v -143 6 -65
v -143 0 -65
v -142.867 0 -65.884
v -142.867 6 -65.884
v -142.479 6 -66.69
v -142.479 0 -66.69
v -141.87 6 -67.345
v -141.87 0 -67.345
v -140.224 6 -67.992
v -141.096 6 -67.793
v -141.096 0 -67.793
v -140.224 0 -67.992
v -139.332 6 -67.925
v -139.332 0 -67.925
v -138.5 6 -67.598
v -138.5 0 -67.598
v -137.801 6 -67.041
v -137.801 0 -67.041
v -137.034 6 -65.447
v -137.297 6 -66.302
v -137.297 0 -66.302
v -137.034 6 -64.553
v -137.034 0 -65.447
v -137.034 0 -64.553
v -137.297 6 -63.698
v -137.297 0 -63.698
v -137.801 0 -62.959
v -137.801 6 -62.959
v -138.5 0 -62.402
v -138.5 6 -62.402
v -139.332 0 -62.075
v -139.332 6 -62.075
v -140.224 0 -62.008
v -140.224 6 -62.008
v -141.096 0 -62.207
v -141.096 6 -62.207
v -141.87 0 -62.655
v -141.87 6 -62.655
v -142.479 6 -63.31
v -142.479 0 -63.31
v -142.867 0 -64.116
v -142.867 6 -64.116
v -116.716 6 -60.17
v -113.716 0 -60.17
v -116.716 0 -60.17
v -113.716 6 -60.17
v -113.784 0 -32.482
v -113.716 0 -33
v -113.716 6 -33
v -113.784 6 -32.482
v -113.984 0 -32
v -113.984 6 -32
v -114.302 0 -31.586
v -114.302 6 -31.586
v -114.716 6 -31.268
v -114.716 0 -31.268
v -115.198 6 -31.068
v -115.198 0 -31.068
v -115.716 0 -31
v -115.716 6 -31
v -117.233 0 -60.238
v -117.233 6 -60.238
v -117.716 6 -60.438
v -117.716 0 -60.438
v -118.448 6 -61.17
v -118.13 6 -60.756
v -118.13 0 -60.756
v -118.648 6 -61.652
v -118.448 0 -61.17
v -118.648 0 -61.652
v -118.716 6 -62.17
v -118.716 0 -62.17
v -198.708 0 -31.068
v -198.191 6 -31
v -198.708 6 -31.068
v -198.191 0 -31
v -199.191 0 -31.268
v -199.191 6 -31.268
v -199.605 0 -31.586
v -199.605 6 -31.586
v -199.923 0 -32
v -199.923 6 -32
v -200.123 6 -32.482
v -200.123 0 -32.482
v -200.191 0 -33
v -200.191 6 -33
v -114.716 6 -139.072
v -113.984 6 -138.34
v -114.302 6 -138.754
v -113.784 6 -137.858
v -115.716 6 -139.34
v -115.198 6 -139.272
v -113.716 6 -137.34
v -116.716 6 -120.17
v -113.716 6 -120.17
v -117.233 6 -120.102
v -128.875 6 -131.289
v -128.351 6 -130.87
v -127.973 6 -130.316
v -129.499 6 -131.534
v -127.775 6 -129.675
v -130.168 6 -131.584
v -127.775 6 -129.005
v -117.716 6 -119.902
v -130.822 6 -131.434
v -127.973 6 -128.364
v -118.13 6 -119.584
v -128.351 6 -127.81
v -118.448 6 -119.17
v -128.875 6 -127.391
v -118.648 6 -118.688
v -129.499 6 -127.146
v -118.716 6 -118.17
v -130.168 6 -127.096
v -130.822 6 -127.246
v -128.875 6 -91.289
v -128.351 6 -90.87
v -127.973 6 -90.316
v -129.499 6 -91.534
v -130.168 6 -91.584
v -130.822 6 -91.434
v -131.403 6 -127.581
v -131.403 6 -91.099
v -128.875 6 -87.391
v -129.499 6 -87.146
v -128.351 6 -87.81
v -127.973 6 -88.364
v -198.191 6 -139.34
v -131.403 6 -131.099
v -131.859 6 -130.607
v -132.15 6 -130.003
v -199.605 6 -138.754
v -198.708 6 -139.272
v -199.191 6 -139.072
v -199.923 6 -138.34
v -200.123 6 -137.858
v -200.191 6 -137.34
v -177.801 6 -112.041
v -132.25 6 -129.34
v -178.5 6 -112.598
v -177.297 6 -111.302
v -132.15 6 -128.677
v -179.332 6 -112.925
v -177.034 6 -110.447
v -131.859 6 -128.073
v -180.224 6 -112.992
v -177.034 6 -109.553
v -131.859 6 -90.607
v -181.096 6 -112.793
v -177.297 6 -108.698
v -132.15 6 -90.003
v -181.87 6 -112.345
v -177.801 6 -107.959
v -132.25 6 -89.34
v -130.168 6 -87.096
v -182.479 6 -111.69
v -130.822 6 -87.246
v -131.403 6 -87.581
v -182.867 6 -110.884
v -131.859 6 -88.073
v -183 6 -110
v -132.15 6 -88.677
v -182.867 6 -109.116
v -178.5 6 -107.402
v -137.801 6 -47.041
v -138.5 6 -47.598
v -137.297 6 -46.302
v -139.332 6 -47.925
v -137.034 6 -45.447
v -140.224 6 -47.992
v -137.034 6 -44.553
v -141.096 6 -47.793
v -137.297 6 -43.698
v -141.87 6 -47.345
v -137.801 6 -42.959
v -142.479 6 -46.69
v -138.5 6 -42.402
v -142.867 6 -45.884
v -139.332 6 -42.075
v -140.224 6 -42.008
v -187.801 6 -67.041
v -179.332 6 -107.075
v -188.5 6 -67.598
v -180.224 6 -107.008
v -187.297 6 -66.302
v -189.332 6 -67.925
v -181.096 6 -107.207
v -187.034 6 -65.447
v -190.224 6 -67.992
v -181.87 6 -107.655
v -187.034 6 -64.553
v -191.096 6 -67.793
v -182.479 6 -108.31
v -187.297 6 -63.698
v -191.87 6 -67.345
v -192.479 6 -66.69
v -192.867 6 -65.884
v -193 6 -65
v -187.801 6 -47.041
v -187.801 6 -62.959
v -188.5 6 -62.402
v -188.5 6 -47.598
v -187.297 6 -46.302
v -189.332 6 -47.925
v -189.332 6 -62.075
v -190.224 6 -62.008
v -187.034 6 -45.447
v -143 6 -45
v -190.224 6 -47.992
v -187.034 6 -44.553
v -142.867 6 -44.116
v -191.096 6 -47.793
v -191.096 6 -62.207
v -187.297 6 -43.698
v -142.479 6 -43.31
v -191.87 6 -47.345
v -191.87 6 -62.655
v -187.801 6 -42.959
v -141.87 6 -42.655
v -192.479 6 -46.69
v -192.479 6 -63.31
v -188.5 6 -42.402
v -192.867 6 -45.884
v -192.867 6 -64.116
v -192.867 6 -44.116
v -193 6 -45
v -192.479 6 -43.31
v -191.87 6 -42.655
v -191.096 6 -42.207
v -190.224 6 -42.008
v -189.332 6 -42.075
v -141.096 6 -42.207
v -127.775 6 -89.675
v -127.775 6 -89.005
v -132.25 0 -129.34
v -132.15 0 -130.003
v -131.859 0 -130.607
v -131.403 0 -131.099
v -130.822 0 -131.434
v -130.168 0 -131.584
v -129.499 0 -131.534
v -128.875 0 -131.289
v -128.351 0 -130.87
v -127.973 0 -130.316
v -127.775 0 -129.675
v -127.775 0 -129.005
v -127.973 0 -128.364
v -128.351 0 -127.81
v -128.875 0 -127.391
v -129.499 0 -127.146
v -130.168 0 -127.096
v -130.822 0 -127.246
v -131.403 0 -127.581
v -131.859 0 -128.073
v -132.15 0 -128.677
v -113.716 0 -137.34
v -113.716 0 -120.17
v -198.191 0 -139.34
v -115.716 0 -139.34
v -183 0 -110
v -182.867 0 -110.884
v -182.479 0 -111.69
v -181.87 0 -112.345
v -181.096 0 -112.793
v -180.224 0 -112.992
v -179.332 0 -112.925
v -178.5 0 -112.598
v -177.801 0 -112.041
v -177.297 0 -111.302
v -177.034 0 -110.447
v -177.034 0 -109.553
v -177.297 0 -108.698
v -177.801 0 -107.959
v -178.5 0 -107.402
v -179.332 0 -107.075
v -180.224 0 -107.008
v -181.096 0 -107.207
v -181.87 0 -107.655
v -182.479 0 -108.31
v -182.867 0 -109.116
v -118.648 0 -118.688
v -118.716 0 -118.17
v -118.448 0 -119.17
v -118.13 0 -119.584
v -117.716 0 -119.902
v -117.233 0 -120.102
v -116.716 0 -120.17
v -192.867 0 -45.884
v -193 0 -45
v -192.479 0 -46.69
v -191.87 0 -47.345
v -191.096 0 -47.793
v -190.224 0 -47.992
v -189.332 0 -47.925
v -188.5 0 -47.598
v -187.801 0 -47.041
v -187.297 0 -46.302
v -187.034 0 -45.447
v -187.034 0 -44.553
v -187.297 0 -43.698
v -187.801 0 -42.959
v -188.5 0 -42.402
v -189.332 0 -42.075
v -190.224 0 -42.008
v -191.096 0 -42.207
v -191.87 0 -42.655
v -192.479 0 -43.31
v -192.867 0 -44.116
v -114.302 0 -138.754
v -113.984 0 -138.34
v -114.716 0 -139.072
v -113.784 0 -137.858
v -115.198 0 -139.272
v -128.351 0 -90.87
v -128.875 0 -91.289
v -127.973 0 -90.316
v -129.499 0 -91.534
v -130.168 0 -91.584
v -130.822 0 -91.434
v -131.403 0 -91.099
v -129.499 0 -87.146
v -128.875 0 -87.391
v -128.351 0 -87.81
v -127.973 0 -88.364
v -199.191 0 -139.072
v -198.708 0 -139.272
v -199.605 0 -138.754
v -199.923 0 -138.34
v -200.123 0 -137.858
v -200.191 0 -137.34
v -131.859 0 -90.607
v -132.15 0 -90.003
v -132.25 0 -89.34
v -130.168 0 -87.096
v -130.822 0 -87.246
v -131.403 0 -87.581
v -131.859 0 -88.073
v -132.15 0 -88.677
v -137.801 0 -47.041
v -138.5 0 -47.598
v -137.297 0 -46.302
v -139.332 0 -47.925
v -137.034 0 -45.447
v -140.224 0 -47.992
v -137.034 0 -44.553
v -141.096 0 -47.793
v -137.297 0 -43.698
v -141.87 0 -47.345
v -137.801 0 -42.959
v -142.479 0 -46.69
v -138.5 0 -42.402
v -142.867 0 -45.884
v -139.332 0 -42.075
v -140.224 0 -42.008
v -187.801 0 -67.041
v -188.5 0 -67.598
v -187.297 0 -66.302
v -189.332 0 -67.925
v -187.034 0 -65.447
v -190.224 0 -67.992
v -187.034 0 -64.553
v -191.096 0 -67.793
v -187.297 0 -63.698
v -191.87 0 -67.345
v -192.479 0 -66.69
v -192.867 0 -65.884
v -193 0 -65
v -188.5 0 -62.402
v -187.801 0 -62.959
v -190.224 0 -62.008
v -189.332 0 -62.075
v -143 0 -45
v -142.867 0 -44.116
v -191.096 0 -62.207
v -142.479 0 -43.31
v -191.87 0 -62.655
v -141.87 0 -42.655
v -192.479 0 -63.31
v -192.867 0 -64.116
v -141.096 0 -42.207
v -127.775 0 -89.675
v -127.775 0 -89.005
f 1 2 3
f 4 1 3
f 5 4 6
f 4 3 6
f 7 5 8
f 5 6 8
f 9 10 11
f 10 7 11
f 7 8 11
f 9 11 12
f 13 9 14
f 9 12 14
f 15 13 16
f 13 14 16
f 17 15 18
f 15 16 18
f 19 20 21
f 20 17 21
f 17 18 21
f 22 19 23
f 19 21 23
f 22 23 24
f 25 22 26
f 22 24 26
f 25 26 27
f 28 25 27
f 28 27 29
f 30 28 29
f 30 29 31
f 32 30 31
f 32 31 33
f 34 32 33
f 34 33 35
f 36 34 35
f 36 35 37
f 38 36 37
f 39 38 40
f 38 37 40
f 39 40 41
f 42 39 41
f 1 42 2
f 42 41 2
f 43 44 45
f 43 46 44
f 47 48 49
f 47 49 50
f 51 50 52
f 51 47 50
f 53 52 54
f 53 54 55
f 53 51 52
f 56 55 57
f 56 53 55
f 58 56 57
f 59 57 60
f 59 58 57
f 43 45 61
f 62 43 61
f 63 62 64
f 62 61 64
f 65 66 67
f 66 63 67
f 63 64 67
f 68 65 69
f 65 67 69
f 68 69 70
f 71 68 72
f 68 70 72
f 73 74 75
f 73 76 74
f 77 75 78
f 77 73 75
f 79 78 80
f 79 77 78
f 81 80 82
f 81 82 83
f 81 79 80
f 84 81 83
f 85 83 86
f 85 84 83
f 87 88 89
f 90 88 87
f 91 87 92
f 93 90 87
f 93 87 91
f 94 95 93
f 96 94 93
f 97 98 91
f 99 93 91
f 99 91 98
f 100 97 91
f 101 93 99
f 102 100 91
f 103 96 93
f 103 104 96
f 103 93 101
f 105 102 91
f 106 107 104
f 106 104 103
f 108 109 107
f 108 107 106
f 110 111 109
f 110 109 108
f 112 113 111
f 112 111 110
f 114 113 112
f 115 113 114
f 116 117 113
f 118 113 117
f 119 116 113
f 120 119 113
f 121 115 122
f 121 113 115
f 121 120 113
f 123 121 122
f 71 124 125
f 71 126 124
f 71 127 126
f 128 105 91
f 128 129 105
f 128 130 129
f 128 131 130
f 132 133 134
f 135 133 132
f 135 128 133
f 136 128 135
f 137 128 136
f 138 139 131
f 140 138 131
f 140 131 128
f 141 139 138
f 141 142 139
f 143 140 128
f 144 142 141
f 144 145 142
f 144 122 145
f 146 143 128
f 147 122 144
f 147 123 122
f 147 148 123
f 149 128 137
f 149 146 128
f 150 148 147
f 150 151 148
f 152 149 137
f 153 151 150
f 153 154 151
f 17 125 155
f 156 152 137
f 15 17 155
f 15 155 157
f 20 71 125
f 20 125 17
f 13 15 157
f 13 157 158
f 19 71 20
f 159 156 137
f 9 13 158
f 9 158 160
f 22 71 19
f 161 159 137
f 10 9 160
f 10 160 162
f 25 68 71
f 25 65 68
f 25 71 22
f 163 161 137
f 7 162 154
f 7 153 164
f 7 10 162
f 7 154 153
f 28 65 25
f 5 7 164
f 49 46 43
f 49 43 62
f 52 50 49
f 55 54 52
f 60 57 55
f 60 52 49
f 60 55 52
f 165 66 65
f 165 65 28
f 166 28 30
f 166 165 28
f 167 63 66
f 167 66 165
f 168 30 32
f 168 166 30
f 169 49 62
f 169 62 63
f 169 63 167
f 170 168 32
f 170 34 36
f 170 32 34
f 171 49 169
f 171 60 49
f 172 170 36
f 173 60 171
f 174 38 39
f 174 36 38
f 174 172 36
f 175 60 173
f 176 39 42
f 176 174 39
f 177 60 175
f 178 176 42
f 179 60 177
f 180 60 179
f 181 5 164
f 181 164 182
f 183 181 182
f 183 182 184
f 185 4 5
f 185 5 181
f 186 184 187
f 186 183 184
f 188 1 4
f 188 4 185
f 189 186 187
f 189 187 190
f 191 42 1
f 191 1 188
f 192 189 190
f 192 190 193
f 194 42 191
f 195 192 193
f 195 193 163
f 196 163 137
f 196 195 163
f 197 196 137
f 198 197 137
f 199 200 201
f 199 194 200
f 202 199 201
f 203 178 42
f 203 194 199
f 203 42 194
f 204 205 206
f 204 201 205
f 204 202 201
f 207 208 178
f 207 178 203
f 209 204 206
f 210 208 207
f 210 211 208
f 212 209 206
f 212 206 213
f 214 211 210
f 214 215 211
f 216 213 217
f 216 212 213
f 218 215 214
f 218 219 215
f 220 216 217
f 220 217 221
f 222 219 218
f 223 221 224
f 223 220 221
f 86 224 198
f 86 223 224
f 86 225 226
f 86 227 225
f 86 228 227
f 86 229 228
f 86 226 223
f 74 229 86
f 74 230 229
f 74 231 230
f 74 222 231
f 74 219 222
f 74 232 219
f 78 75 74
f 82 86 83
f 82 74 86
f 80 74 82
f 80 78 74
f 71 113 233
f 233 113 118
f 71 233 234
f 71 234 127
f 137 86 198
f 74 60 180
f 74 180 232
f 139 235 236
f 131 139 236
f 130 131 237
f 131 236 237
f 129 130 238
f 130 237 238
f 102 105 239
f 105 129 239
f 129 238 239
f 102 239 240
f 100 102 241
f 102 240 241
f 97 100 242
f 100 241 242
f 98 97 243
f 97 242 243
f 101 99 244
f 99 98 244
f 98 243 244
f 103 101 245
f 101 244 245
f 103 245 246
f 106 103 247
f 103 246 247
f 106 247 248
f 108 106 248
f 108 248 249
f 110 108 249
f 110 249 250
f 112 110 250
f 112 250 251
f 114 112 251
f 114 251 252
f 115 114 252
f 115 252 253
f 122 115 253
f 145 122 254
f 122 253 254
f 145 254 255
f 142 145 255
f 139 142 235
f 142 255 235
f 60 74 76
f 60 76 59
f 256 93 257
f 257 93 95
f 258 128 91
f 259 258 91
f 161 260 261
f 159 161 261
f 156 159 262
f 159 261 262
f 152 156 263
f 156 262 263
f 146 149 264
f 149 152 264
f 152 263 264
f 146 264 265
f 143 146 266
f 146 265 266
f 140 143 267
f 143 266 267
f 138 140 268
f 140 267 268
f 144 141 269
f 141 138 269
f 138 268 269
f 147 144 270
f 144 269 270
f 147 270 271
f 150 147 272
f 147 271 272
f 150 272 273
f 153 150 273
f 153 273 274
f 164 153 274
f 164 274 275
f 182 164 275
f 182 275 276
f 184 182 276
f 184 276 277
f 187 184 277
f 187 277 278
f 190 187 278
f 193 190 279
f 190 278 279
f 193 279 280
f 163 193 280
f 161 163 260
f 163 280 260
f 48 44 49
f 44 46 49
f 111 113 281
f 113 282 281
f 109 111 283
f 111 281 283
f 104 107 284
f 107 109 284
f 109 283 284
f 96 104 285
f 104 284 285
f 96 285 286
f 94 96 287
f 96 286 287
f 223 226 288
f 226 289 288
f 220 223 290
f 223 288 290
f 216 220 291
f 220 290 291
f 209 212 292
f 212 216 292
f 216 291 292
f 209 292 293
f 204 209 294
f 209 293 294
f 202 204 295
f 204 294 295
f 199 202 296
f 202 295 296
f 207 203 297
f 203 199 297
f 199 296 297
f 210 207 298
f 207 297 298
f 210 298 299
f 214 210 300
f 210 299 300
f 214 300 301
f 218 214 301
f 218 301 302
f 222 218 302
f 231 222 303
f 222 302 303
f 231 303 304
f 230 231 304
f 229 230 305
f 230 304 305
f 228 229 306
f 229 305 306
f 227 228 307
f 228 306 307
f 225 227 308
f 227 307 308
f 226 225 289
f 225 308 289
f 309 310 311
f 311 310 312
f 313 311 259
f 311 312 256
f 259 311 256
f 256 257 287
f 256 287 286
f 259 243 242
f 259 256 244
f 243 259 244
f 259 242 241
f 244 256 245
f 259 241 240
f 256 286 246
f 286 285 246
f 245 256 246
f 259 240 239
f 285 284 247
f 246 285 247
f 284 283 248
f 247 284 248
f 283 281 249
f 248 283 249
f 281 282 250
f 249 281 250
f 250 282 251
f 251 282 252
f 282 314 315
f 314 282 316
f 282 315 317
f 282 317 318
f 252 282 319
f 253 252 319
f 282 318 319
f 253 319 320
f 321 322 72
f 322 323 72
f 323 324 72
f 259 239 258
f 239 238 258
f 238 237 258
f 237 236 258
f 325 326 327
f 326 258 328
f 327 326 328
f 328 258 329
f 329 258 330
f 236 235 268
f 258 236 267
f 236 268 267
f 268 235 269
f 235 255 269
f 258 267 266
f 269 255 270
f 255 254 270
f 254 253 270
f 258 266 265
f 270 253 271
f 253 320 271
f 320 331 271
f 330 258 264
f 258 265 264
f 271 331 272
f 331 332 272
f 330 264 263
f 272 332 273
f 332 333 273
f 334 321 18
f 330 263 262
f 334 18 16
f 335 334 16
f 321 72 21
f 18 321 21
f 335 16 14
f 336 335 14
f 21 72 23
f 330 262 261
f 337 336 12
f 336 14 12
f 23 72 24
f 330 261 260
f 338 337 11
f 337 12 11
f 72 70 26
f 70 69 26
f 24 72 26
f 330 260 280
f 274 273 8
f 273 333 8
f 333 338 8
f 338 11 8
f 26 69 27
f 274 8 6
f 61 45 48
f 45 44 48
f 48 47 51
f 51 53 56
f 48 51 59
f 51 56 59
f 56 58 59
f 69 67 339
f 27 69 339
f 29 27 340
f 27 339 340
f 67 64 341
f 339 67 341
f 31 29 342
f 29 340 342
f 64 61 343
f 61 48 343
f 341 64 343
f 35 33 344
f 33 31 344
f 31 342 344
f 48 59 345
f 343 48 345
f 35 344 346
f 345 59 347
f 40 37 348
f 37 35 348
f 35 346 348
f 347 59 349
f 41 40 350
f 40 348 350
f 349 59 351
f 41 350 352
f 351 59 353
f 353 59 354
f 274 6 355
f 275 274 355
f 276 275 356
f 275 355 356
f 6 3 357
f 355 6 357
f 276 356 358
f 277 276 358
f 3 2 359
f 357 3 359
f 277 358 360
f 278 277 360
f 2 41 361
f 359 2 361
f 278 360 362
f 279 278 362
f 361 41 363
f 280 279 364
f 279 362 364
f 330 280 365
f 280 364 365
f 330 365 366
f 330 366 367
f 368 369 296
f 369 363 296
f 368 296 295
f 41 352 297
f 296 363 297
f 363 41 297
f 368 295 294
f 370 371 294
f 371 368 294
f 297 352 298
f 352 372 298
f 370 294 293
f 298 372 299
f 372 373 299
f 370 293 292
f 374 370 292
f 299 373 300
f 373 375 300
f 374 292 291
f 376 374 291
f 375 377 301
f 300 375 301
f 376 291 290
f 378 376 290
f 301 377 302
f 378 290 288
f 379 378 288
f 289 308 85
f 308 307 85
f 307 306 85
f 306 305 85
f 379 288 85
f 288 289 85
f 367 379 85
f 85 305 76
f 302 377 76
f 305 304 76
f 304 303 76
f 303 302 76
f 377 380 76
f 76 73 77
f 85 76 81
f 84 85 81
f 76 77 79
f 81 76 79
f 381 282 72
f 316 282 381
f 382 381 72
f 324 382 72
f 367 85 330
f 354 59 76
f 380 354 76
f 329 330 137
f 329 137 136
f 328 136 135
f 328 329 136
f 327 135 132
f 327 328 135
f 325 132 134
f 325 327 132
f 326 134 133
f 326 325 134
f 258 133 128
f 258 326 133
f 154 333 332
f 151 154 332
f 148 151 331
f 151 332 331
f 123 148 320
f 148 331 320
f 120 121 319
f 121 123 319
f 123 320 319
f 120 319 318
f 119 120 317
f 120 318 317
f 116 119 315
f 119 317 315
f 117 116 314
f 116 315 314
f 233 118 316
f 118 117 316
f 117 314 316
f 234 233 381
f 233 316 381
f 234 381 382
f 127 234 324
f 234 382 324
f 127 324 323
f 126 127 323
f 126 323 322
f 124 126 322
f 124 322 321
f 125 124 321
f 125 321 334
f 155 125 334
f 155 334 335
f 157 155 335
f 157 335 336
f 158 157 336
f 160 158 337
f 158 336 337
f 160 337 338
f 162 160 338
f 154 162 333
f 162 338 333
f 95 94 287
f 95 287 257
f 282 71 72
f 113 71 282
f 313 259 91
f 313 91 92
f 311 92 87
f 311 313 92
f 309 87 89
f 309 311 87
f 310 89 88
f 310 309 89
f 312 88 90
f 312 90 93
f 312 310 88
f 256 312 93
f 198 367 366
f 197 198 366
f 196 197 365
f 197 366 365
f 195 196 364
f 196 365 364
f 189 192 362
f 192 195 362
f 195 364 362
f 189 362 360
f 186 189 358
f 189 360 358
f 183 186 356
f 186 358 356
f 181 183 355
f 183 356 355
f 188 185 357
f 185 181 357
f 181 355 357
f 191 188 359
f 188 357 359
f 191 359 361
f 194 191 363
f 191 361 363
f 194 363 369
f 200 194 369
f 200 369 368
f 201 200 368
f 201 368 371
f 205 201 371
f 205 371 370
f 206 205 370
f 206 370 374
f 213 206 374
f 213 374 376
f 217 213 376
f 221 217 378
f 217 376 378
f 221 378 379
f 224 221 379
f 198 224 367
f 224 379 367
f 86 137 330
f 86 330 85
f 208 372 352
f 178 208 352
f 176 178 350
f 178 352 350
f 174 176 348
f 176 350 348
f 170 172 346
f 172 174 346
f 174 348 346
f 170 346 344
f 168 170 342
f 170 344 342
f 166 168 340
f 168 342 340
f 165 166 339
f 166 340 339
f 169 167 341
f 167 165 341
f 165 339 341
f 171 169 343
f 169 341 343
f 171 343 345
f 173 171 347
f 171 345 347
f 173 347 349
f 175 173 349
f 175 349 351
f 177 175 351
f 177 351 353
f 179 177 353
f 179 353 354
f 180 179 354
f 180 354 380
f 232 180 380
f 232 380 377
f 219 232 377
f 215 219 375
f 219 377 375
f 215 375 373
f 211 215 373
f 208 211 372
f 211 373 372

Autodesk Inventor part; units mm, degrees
ref_plane "YZ Plane" through (0, 0, 0) normal (1, 0, 0) x (0, 1, 0)
ref_plane "XZ Plane" through (0, 0, 0) normal (0, 1, 0) x (-1, 0, 0)
ref_plane "XY Plane" through (0, 0, 0) normal (0, 0, 1) x (1, 0, 0)
sketch "Sketch1" plane through (0, 0, 0) normal (0, 1, 0) x (-1, 0, 0)
  line L0 (232.1908, -176.5808) -> (232.1908, -3.7592)
  arc A0 (232.1908, -3.7592) -> (227.4316, 1) centre (227.4316, -3.7592) ccw
  line L1 (227.4316, 1) -> (0, 1)
  arc A1 (0, 1) -> (-4.7592, -3.7592) centre (0, -3.7592) ccw
  arc A2 (-4.7592, -176.5808) -> (0, -181.34) centre (0, -176.5808) ccw
  arc A3 (227.4316, -181.34) -> (232.1908, -176.5808) centre (227.4316, -176.5808) ccw
  circle A4 centre (130, -129.34) radius 2.25
  circle A5 centre (130, -89.34) radius 2.25
  circle A6 centre (90, -129.34) radius 2.25
  circle A7 centre (90, -89.34) radius 2.25
  circle A8 centre (180, -110) radius 3
  circle A9 centre (55, -110) radius 3
  circle A10 centre (90, -45) radius 3
  circle A11 centre (190, -45) radius 3
  circle A12 centre (190, -65) radius 3
  circle A13 centre (90, -65) radius 3
  circle A14 centre (140, -45) radius 3
  circle A15 centre (40, -45) radius 3
  circle A16 centre (140, -65) radius 3
  circle A17 centre (40, -65) radius 3
  line L2 (230.1908, -176.5808) -> (230.1908, -3.7592)
  arc A18 (230.1908, -3.7592) -> (227.4316, -1) centre (227.4316, -3.7592) ccw
  line L3 (227.4316, -1) -> (0, -1)
  arc A19 (0, -1) -> (-2.7592, -3.7592) centre (0, -3.7592) ccw
  arc A20 (-2.7592, -176.5808) -> (0, -179.34) centre (0, -176.5808) ccw
  arc A21 (227.4316, -179.34) -> (230.1908, -176.5808) centre (227.4316, -176.5808) ccw
  line L4 (-4.7592, -3.7592) -> (-4.7592, -176.5808)
  line L5 (-2.7592, -3.7592) -> (-2.7592, -176.5808)
  line L6 (0, -179.34) -> (227.4316, -179.34)
  line L7 (227.4316, -181.34) -> (0, -181.34)
  line L8 (0, 0) -> (0, -15)
  line L9 (0, 0) -> (15, 0) construction
  line L10 (0, 0) -> (15, 0)
  line L11 (0, 0) -> (15, 0) construction
  point P0 (230.1908, -3.7592)
  point P1 (0, -1)
  dimension "d0" = 2
  dimension "d1" = 2
  dimension "d2" = 2
  dimension "d3" = 2
  dimension "d5" = 2
  dimension "d7" = 2
  dimension "d8" = 227.4316
  dimension "d9" = 172.8216
  dimension "d10" = 4.7592
  dimension "d45" = 15
  dimension "d46" = 90
  dimension "d47" = 15
  dimension "d48" = 0
  dimension "d49" = 55
  dimension "d50" = 110
  dimension "d51" = 125
  dimension "d52" = 110
  dimension "d54" = 6
  dimension "d55" = 6
  dimension "d56" = 4.5
  dimension "d57" = 6
  dimension "d58" = 6
  dimension "d59" = 6
  dimension "d60" = 6
  dimension "d61" = 6
  dimension "d62" = 6
  dimension "d63" = 6
  dimension "d64" = 6
  dimension "d65" = 4.5
  dimension "d66" = 4.5
  dimension "d67" = 4.5
  dimension "d68" = 172.8216
  dimension "d69" = 2.7592
  dimension "d70" = 172.8216
  dimension "d71" = 2
  dimension "d72" = 1
  dimension "d73" = 230.1908
  dimension "d74" = 179.34
  dimension "d75" = 2
  dimension "d76" = 50
  dimension "d77" = 40
  dimension "d78" = 40
  dimension "d79" = 100.1908
extrude "Extrusion1" add sketch "Sketch1" along normal blind 6 contours A21 L6 A20 L5 A19 L3 A18 L2
sketch "Sketch2" plane through (0, 6, 0) normal (0, 1, 0) x (1, 0, 0)
  line L0 (-232.1908, 176.5808) -> (-232.1908, 3.7592)
  arc A0 (-232.1908, 3.7592) -> (-227.4316, -1) centre (-227.4316, 3.7592) ccw
  line L1 (-227.4316, -1) -> (0, -1)
  arc A1 (0, -1) -> (4.7592, 3.7592) centre (0, 3.7592) ccw
  arc A2 (4.7592, 176.5808) -> (0, 181.34) centre (0, 176.5808) ccw
  arc A3 (-227.4316, 181.34) -> (-232.1908, 176.5808) centre (-227.4316, 176.5808) ccw
  circle A4 centre (-130, 135) radius 2
  circle A5 centre (-130, 95) radius 2
  circle A6 centre (-90, 135) radius 2
  circle A7 centre (-90, 95) radius 2
  circle A8 centre (-160.0797, 100) radius 2.75
  circle A9 centre (-60.0797, 100) radius 2.75
  circle A10 centre (-90, 45) radius 2.5
  circle A11 centre (-190, 45) radius 2.5
  circle A12 centre (-190, 65) radius 2.5
  circle A13 centre (-90, 65) radius 2.5
  circle A14 centre (-140, 45) radius 2.5
  circle A15 centre (-40, 45) radius 2.5
  circle A16 centre (-140, 65) radius 2.5
  circle A17 centre (-40, 65) radius 2.5
  line L2 (-230.1908, 176.5808) -> (-230.1908, 3.7592)
  arc A18 (-230.1908, 3.7592) -> (-227.4316, 1) centre (-227.4316, 3.7592) ccw
  line L3 (-227.4316, 1) -> (0, 1)
  arc A19 (0, 1) -> (2.7592, 3.7592) centre (0, 3.7592) ccw
  arc A20 (2.7592, 176.5808) -> (0, 179.34) centre (0, 176.5808) ccw
  arc A21 (-227.4316, 179.34) -> (-230.1908, 176.5808) centre (-227.4316, 176.5808) ccw
  line L4 (4.7592, 3.7592) -> (4.7592, 176.5808)
  line L5 (2.7592, 3.7592) -> (2.7592, 176.5808)
  line L6 (0, 179.34) -> (-227.4316, 179.34)
  line L7 (-227.4316, 181.34) -> (0, 181.34)
  line L8 (0, 179.34) -> (-227.4316, 179.34) projected
  line L9 (-113.7158, 179.34) -> (-113.7158, 1)
  line L10 (-227.4316, 1) -> (0, 1) projected
  line L11 (-118.7158, 120.17) -> (-108.7158, 120.17)
  line L12 (-108.7158, 120.17) -> (-108.7158, 60.17)
  line L13 (-108.7158, 60.17) -> (-118.7158, 60.17)
  line L14 (-118.7158, 60.17) -> (-118.7158, 120.17)
  line L15 (-118.7158, 120.17) -> (-108.7158, 60.17) construction
  line L16 (-108.7158, 120.17) -> (-118.7158, 60.17) construction
  line L17 (-113.7158, 179.34) -> (-113.7158, 159.34)
  line L18 (2.7592, 139.34) -> (-230.1908, 139.34)
  line L19 (-230.1908, 139.34) -> (-230.1908, 179.34)
  line L20 (-230.1908, 179.34) -> (2.7592, 179.34)
  line L21 (2.7592, 179.34) -> (2.7592, 139.34)
  line L22 (2.7592, 139.34) -> (-230.1908, 179.34) construction
  line L23 (-230.1908, 139.34) -> (2.7592, 179.34) construction
  line L24 (-113.7158, 1) -> (-113.7158, 16)
  line L25 (-230.1908, 31) -> (2.7592, 31)
  line L26 (2.7592, 31) -> (2.7592, 1)
  line L27 (2.7592, 1) -> (-230.1908, 1)
  line L28 (-230.1908, 1) -> (-230.1908, 31)
  line L29 (-230.1908, 31) -> (2.7592, 1) construction
  line L30 (2.7592, 31) -> (-230.1908, 1) construction
  line L31 (-227.4316, 1) -> (0, 1) projected
  line L32 (-230.1908, 179.34) -> (-200.1908, 179.34)
  line L33 (-200.1908, 179.34) -> (-200.1908, 1)
  line L34 (-200.1908, 1) -> (-230.1908, 1)
  line L35 (-230.1908, 1) -> (-230.1908, 179.34)
  line L36 (2.7592, 1) -> (-27.2408, 1)
  line L37 (-27.2408, 1) -> (-27.2408, 179.34)
  line L38 (-27.2408, 179.34) -> (2.7592, 179.34)
  line L39 (2.7592, 179.34) -> (2.7592, 1)
  line L40 (-200.1908, 139.34) -> (-113.7158, 139.34)
  point P0 (230.1908, -176.5808)
  point P1 (230.1908, -3.7592)
  point P2 (227.4316, -1)
  point P3 (0, -1)
  point P4 (0, 0)
  point P5 (230.1908, -176.5808)
  point P6 (230.1908, -3.7592)
  point P7 (227.4316, -1)
  point P8 (0, -1)
  point P9 (-113.7158, 90.17)
  point P10 (-113.7158, 120.17)
  point P11 (-113.7158, 60.17)
  point P12 (-113.7158, 1)
  point P13 (0, 1)
  point P14 (-113.7158, 139.34)
  point P15 (-113.7158, 31)
  point P16 (-200.1908, 31)
  point P17 (-230.1908, 3.7592)
  point P18 (-227.4316, 1)
  dimension "d22" = 2
  dimension "d23" = 2
  dimension "d24" = 2
  dimension "d25" = 2
  dimension "d26" = 2
  dimension "d27" = 2
  dimension "d28" = 227.4316
  dimension "d29" = 172.8216
  dimension "d30" = 4.7592
  dimension "d31" = 10
  dimension "d32" = 60
  dimension "d37" = 20
  dimension "d38" = 40
  dimension "d39" = 15
  dimension "d40" = 30
  dimension "d41" = 30
  dimension "d42" = 30
extrude "Extrusion3" cut sketch "Sketch2" against normal through all contours A6 | A7 | A9 | A10 | A13 | A15 | A17 | A21 L6 L33 L18 L2 | L18 L33 L25 L2 | L25 L33 L3 A18 L2 | L33 L6 L9 L18 | L25 L9 L3 L33 | L18 L37 L25 L9 L13 L12 L11 | L9 L6 L37 L18 | L25 L37 L3 L9 | L11 L12 L13 L9 | L9 L13 L14 L11 | L37 L6 A20 L5 L18 | L18 L5 L25 L37 | L25 L5 A19 L3 L37
fillet "Fillet3" radius 2 6 edges at (-113.7158, 3, -31) (-200.1908, 3, -31) (-113.7158, 3, -139.34) (-118.7158, 3, -120.17) (-118.7158, 3, -60.17) (-200.1908, 3, -139.34)
equation "\"d1\" = d0"
equation "\"d2\" = d0"
equation "\"d3\" = d0"
equation "\"d5\" = d0"
equation "\"d7\" = d0"
equation "\"d23\" = d22"
equation "\"d24\" = d22"
equation "\"d25\" = d22"
equation "\"d26\" = d22"
equation "\"d27\" = d22"
properties part number "EboxBottom_1"
